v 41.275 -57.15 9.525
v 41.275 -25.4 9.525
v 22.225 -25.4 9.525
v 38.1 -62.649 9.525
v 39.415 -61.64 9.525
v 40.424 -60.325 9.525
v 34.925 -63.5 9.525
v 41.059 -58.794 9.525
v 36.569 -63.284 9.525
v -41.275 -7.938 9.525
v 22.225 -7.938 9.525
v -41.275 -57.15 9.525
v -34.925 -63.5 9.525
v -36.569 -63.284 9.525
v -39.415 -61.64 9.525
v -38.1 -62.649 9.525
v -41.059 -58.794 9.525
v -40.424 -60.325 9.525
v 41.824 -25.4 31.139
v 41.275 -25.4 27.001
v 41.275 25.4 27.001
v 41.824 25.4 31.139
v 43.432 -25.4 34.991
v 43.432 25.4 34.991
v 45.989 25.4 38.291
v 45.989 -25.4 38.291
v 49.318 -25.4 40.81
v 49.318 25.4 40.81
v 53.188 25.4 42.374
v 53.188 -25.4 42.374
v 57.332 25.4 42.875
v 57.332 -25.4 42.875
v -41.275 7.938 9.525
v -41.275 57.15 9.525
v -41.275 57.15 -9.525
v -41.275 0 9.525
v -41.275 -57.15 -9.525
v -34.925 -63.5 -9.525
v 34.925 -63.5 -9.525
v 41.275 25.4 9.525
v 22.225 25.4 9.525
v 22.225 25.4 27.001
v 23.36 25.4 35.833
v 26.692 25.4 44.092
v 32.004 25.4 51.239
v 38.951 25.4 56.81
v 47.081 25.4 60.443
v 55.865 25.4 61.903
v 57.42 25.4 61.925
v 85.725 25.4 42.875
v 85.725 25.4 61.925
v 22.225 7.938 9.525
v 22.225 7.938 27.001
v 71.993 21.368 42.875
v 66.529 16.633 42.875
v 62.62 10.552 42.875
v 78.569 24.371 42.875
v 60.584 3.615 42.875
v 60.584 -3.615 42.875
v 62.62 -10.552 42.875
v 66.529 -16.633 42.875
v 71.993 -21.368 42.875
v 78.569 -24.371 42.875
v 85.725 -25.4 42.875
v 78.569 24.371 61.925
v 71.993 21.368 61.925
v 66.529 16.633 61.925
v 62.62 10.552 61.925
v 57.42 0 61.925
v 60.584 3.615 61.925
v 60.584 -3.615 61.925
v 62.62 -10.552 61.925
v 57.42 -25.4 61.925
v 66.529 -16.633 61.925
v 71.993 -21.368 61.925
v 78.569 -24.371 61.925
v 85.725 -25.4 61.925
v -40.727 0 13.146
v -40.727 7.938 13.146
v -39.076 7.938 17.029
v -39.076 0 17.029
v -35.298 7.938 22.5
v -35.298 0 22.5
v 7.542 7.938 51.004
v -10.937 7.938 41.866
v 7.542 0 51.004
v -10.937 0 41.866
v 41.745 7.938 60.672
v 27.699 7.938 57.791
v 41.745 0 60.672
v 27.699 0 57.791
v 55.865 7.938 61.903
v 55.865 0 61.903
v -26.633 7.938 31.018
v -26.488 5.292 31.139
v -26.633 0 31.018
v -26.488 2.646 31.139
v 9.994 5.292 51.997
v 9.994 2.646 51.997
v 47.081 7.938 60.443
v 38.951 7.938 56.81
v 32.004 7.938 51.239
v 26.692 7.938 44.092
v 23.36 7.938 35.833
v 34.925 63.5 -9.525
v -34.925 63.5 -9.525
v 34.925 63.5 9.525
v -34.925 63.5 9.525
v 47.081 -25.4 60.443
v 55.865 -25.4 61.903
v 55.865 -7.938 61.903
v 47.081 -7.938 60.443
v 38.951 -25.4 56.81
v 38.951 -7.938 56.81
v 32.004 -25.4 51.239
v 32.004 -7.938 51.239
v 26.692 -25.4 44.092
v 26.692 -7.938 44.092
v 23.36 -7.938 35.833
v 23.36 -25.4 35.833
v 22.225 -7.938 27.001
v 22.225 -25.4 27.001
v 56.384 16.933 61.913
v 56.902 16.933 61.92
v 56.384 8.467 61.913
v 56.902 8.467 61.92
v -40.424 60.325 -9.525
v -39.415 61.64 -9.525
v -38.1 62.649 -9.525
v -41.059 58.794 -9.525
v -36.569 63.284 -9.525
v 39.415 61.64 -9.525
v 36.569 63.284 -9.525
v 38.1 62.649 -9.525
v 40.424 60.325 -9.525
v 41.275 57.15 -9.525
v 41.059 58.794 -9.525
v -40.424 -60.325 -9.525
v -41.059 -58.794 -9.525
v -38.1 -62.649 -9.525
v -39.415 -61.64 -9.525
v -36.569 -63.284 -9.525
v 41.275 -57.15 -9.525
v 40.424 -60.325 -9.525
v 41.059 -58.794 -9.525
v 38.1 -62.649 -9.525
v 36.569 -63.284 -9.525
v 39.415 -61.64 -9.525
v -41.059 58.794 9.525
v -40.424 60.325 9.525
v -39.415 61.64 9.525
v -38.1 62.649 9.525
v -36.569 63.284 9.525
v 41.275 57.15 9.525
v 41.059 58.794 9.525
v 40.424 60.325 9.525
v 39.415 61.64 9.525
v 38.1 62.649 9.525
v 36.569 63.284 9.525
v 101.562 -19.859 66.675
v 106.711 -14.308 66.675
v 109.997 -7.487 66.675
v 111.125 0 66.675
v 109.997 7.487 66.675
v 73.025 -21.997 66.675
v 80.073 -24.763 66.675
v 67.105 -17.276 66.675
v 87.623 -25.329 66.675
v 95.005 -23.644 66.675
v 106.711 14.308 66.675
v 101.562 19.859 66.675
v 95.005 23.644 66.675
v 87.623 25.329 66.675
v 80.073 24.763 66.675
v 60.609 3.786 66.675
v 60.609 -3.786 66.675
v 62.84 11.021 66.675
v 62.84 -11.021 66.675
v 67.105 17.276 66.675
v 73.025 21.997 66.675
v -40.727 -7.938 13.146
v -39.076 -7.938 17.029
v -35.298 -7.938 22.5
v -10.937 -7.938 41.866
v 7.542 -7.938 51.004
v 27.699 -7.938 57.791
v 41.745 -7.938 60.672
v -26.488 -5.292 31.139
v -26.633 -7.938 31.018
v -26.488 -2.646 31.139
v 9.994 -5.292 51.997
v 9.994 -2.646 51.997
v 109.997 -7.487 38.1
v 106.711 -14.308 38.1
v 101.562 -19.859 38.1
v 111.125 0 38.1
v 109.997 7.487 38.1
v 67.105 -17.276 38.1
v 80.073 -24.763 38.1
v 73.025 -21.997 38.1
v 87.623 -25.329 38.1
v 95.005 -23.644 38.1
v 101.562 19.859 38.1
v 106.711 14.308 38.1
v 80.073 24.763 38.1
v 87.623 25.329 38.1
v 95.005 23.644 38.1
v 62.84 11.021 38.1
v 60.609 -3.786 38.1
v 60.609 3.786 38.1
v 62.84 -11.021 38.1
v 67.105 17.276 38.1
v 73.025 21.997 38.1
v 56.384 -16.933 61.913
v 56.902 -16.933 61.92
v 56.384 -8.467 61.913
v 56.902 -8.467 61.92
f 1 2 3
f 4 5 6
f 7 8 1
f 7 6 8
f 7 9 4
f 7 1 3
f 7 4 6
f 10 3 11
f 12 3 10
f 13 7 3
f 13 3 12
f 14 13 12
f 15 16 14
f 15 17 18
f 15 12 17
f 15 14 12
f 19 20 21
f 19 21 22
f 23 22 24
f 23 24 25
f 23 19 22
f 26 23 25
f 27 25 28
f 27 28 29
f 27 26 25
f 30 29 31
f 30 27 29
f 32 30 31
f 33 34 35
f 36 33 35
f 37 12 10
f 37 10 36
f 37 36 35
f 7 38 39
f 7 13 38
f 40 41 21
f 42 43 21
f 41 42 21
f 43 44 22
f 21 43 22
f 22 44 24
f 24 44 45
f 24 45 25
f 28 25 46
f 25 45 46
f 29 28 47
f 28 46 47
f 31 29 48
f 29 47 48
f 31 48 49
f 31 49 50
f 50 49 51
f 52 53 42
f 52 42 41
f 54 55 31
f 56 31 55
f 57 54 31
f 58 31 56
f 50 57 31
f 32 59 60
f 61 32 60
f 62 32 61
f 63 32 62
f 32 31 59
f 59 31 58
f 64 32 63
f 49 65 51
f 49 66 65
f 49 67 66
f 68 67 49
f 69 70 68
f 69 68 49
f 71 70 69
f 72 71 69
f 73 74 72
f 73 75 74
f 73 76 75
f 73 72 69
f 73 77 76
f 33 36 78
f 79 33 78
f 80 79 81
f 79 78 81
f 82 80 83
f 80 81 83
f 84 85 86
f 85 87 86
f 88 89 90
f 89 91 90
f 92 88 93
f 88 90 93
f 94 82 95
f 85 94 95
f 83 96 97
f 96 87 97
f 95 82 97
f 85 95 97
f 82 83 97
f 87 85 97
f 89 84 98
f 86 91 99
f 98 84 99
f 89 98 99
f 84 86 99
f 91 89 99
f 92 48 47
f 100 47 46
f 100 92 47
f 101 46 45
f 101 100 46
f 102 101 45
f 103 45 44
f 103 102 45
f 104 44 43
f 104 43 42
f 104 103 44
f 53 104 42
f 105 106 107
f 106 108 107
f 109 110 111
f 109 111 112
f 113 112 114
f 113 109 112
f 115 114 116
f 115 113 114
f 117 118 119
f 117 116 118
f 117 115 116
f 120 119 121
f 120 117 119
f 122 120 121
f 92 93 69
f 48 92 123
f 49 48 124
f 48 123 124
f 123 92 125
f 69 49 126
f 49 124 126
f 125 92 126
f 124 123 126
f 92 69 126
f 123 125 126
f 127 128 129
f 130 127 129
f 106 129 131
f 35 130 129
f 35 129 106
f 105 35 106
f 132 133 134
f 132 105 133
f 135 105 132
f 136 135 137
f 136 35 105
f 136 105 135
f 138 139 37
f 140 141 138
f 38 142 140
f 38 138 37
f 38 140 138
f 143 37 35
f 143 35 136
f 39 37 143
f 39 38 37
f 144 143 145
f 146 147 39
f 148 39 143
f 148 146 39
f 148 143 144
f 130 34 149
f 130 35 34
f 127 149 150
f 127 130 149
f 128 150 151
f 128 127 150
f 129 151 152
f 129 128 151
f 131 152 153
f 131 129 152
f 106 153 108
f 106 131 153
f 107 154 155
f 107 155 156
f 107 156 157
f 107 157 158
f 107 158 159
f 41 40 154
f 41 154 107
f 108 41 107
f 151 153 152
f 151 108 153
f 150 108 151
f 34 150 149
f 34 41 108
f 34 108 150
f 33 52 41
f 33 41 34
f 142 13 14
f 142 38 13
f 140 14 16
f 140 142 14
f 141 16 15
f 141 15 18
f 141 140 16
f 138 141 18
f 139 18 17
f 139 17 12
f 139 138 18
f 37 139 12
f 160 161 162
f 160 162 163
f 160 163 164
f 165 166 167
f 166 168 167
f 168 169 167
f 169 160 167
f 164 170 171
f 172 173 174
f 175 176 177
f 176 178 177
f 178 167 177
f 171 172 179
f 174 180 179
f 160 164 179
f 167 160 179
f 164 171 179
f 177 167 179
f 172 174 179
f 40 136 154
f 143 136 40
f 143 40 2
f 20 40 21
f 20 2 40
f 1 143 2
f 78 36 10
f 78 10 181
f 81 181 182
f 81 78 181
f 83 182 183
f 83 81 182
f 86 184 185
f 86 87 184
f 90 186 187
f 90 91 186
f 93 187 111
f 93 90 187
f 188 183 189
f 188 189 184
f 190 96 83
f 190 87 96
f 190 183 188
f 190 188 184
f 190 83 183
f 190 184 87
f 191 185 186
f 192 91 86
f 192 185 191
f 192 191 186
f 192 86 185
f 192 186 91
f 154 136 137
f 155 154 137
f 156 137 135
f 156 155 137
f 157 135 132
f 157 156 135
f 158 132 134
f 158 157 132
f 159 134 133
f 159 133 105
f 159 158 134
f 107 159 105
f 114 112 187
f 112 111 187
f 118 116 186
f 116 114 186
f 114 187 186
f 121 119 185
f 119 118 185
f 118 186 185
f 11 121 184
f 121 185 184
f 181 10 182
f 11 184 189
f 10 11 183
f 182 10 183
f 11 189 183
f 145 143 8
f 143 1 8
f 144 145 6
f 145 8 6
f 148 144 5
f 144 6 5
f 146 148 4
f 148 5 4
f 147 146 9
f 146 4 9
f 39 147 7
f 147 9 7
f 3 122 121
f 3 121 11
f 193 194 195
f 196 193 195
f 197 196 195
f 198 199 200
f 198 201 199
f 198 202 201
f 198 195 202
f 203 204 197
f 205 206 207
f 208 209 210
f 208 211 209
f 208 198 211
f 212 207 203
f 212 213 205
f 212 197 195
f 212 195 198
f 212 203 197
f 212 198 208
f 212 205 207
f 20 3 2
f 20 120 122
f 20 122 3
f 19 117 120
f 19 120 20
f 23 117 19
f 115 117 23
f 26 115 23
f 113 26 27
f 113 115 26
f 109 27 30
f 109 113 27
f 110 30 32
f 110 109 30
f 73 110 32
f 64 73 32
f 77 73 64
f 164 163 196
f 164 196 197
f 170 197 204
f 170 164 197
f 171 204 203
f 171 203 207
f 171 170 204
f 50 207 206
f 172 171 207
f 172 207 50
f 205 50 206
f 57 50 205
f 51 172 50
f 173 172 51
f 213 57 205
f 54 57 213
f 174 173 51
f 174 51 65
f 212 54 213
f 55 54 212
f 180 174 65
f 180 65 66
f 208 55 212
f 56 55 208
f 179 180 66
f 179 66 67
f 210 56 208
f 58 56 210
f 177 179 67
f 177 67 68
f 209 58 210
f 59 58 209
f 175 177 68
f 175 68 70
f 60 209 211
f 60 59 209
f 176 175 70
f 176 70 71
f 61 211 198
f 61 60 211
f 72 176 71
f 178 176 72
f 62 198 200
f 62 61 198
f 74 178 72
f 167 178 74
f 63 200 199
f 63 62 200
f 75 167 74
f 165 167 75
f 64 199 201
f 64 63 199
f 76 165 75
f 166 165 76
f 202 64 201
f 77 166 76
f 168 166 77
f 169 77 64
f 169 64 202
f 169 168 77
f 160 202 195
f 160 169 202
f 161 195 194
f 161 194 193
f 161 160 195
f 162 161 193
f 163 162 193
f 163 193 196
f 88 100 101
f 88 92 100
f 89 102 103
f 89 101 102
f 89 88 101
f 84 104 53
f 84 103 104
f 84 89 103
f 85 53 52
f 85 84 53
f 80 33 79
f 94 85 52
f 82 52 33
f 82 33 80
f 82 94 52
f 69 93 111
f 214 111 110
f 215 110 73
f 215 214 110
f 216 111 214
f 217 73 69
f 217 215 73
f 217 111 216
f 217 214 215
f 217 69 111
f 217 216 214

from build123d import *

# Parameters (mm, degrees)
F1_DEPTH = 63.5
F0_W     = 25.4
F0_H     = 19.0499988828
F2_DEPTH = 25.4
F3_DEPTH = 7.9375
F0_H_2   = 4.7498011172
F5_R     = 6.35


with BuildPart() as f1:
    # F0 (on Front) → F1 (new body, symmetric)
    with BuildSketch(Plane.XZ):
        Polygon((-41.275, -9.525), (41.275, -9.525), (41.275, 9.525), (22.2250011172, 9.525), (-41.275, 9.525), align=None)
    extrude(amount=F1_DEPTH, both=True)

    # F0 (on Front) → F2 (join, symmetric)
    with BuildSketch(Plane.XZ):
        with BuildLine():
            Line((22.2250011172, 9.525), (41.275, 9.525))
            Line((41.275, 9.525), (41.275, 27.0012465922))
            ThreePointArc((41.275, 27.0012465922), (45.989313778, 38.2908306436), (57.332286054, 42.8752))
            Line((57.332286054, 42.8752), (60.325, 42.8752))
            Line((60.325, 42.8752), (60.325, 61.9251988828))
            Line((60.325, 61.9251988828), (57.420376338, 61.9251988828))
            add(Edge.make_bspline(
                [(55.8653542089, 61.902610923), (56.3842660516, 61.9141182995), (56.9026324706, 61.9216689247), (57.420376338, 61.9251988828)],
                knots=[110.5091164391, 110.5091164391, 110.5091164391, 110.5091164391, 111.7432689403, 111.7432689403, 111.7432689403, 111.7432689403], degree=3))
            ThreePointArc((55.8653542089, 61.902610923), (32.0042071135, 51.2385040086), (22.2250011172, 27.0012465922))
            Line((22.2250011172, 27.0012465922), (22.2250011172, 9.525))
        make_face()
        with Locations((73.025, 52.4001994414)):
            Rectangle(F0_W, F0_H)
    extrude(amount=F2_DEPTH, both=True)

    # F0 (on Front) → F3 (join, symmetric)
    with BuildSketch(Plane.XZ):
        with BuildLine():
            add(Edge.make_bspline(
                [(-41.275, 9.525), (-41.4371192088, 28.1171277164), (9.4006837592, 60.8722115153), (55.8653542089, 61.902610923)],
                knots=[0, 0, 0, 0, 110.5091164391, 110.5091164391, 110.5091164391, 110.5091164391], degree=3))
            Line((-41.275, 9.525), (22.2250011172, 9.525))
            Line((22.2250011172, 9.525), (22.2250011172, 27.0012465922))
            ThreePointArc((22.2250011172, 27.0012465922), (32.0042071135, 51.2385040086), (55.8653542089, 61.902610923))
        make_face()
    extrude(amount=F3_DEPTH, both=True)

    # F0 (on Front) → F4 (revolve)
    with BuildSketch(Plane.XZ):
        with Locations((98.425, 64.3000994414)):
            Rectangle(F0_W, F0_H_2)
        Polygon((85.725, 61.9251988828), (85.725, 42.8752), (85.725, 38.1), (111.125, 38.1), (111.125, 61.9251988828), align=None)
    revolve(axis=Axis((85.725, 0, 52.3875), (0, 0, 1)))

    # F5
    f5_edges = [f1.edges().sort_by_distance(p)[0] for p in [
        (-41.275, -63.5, 0),
        (41.275, -63.5, 0),
        (41.275, 63.5, 0),
        (-41.275, 63.5, 0),
    ]]
    fillet(f5_edges, radius=F5_R)


solid = f1.part
